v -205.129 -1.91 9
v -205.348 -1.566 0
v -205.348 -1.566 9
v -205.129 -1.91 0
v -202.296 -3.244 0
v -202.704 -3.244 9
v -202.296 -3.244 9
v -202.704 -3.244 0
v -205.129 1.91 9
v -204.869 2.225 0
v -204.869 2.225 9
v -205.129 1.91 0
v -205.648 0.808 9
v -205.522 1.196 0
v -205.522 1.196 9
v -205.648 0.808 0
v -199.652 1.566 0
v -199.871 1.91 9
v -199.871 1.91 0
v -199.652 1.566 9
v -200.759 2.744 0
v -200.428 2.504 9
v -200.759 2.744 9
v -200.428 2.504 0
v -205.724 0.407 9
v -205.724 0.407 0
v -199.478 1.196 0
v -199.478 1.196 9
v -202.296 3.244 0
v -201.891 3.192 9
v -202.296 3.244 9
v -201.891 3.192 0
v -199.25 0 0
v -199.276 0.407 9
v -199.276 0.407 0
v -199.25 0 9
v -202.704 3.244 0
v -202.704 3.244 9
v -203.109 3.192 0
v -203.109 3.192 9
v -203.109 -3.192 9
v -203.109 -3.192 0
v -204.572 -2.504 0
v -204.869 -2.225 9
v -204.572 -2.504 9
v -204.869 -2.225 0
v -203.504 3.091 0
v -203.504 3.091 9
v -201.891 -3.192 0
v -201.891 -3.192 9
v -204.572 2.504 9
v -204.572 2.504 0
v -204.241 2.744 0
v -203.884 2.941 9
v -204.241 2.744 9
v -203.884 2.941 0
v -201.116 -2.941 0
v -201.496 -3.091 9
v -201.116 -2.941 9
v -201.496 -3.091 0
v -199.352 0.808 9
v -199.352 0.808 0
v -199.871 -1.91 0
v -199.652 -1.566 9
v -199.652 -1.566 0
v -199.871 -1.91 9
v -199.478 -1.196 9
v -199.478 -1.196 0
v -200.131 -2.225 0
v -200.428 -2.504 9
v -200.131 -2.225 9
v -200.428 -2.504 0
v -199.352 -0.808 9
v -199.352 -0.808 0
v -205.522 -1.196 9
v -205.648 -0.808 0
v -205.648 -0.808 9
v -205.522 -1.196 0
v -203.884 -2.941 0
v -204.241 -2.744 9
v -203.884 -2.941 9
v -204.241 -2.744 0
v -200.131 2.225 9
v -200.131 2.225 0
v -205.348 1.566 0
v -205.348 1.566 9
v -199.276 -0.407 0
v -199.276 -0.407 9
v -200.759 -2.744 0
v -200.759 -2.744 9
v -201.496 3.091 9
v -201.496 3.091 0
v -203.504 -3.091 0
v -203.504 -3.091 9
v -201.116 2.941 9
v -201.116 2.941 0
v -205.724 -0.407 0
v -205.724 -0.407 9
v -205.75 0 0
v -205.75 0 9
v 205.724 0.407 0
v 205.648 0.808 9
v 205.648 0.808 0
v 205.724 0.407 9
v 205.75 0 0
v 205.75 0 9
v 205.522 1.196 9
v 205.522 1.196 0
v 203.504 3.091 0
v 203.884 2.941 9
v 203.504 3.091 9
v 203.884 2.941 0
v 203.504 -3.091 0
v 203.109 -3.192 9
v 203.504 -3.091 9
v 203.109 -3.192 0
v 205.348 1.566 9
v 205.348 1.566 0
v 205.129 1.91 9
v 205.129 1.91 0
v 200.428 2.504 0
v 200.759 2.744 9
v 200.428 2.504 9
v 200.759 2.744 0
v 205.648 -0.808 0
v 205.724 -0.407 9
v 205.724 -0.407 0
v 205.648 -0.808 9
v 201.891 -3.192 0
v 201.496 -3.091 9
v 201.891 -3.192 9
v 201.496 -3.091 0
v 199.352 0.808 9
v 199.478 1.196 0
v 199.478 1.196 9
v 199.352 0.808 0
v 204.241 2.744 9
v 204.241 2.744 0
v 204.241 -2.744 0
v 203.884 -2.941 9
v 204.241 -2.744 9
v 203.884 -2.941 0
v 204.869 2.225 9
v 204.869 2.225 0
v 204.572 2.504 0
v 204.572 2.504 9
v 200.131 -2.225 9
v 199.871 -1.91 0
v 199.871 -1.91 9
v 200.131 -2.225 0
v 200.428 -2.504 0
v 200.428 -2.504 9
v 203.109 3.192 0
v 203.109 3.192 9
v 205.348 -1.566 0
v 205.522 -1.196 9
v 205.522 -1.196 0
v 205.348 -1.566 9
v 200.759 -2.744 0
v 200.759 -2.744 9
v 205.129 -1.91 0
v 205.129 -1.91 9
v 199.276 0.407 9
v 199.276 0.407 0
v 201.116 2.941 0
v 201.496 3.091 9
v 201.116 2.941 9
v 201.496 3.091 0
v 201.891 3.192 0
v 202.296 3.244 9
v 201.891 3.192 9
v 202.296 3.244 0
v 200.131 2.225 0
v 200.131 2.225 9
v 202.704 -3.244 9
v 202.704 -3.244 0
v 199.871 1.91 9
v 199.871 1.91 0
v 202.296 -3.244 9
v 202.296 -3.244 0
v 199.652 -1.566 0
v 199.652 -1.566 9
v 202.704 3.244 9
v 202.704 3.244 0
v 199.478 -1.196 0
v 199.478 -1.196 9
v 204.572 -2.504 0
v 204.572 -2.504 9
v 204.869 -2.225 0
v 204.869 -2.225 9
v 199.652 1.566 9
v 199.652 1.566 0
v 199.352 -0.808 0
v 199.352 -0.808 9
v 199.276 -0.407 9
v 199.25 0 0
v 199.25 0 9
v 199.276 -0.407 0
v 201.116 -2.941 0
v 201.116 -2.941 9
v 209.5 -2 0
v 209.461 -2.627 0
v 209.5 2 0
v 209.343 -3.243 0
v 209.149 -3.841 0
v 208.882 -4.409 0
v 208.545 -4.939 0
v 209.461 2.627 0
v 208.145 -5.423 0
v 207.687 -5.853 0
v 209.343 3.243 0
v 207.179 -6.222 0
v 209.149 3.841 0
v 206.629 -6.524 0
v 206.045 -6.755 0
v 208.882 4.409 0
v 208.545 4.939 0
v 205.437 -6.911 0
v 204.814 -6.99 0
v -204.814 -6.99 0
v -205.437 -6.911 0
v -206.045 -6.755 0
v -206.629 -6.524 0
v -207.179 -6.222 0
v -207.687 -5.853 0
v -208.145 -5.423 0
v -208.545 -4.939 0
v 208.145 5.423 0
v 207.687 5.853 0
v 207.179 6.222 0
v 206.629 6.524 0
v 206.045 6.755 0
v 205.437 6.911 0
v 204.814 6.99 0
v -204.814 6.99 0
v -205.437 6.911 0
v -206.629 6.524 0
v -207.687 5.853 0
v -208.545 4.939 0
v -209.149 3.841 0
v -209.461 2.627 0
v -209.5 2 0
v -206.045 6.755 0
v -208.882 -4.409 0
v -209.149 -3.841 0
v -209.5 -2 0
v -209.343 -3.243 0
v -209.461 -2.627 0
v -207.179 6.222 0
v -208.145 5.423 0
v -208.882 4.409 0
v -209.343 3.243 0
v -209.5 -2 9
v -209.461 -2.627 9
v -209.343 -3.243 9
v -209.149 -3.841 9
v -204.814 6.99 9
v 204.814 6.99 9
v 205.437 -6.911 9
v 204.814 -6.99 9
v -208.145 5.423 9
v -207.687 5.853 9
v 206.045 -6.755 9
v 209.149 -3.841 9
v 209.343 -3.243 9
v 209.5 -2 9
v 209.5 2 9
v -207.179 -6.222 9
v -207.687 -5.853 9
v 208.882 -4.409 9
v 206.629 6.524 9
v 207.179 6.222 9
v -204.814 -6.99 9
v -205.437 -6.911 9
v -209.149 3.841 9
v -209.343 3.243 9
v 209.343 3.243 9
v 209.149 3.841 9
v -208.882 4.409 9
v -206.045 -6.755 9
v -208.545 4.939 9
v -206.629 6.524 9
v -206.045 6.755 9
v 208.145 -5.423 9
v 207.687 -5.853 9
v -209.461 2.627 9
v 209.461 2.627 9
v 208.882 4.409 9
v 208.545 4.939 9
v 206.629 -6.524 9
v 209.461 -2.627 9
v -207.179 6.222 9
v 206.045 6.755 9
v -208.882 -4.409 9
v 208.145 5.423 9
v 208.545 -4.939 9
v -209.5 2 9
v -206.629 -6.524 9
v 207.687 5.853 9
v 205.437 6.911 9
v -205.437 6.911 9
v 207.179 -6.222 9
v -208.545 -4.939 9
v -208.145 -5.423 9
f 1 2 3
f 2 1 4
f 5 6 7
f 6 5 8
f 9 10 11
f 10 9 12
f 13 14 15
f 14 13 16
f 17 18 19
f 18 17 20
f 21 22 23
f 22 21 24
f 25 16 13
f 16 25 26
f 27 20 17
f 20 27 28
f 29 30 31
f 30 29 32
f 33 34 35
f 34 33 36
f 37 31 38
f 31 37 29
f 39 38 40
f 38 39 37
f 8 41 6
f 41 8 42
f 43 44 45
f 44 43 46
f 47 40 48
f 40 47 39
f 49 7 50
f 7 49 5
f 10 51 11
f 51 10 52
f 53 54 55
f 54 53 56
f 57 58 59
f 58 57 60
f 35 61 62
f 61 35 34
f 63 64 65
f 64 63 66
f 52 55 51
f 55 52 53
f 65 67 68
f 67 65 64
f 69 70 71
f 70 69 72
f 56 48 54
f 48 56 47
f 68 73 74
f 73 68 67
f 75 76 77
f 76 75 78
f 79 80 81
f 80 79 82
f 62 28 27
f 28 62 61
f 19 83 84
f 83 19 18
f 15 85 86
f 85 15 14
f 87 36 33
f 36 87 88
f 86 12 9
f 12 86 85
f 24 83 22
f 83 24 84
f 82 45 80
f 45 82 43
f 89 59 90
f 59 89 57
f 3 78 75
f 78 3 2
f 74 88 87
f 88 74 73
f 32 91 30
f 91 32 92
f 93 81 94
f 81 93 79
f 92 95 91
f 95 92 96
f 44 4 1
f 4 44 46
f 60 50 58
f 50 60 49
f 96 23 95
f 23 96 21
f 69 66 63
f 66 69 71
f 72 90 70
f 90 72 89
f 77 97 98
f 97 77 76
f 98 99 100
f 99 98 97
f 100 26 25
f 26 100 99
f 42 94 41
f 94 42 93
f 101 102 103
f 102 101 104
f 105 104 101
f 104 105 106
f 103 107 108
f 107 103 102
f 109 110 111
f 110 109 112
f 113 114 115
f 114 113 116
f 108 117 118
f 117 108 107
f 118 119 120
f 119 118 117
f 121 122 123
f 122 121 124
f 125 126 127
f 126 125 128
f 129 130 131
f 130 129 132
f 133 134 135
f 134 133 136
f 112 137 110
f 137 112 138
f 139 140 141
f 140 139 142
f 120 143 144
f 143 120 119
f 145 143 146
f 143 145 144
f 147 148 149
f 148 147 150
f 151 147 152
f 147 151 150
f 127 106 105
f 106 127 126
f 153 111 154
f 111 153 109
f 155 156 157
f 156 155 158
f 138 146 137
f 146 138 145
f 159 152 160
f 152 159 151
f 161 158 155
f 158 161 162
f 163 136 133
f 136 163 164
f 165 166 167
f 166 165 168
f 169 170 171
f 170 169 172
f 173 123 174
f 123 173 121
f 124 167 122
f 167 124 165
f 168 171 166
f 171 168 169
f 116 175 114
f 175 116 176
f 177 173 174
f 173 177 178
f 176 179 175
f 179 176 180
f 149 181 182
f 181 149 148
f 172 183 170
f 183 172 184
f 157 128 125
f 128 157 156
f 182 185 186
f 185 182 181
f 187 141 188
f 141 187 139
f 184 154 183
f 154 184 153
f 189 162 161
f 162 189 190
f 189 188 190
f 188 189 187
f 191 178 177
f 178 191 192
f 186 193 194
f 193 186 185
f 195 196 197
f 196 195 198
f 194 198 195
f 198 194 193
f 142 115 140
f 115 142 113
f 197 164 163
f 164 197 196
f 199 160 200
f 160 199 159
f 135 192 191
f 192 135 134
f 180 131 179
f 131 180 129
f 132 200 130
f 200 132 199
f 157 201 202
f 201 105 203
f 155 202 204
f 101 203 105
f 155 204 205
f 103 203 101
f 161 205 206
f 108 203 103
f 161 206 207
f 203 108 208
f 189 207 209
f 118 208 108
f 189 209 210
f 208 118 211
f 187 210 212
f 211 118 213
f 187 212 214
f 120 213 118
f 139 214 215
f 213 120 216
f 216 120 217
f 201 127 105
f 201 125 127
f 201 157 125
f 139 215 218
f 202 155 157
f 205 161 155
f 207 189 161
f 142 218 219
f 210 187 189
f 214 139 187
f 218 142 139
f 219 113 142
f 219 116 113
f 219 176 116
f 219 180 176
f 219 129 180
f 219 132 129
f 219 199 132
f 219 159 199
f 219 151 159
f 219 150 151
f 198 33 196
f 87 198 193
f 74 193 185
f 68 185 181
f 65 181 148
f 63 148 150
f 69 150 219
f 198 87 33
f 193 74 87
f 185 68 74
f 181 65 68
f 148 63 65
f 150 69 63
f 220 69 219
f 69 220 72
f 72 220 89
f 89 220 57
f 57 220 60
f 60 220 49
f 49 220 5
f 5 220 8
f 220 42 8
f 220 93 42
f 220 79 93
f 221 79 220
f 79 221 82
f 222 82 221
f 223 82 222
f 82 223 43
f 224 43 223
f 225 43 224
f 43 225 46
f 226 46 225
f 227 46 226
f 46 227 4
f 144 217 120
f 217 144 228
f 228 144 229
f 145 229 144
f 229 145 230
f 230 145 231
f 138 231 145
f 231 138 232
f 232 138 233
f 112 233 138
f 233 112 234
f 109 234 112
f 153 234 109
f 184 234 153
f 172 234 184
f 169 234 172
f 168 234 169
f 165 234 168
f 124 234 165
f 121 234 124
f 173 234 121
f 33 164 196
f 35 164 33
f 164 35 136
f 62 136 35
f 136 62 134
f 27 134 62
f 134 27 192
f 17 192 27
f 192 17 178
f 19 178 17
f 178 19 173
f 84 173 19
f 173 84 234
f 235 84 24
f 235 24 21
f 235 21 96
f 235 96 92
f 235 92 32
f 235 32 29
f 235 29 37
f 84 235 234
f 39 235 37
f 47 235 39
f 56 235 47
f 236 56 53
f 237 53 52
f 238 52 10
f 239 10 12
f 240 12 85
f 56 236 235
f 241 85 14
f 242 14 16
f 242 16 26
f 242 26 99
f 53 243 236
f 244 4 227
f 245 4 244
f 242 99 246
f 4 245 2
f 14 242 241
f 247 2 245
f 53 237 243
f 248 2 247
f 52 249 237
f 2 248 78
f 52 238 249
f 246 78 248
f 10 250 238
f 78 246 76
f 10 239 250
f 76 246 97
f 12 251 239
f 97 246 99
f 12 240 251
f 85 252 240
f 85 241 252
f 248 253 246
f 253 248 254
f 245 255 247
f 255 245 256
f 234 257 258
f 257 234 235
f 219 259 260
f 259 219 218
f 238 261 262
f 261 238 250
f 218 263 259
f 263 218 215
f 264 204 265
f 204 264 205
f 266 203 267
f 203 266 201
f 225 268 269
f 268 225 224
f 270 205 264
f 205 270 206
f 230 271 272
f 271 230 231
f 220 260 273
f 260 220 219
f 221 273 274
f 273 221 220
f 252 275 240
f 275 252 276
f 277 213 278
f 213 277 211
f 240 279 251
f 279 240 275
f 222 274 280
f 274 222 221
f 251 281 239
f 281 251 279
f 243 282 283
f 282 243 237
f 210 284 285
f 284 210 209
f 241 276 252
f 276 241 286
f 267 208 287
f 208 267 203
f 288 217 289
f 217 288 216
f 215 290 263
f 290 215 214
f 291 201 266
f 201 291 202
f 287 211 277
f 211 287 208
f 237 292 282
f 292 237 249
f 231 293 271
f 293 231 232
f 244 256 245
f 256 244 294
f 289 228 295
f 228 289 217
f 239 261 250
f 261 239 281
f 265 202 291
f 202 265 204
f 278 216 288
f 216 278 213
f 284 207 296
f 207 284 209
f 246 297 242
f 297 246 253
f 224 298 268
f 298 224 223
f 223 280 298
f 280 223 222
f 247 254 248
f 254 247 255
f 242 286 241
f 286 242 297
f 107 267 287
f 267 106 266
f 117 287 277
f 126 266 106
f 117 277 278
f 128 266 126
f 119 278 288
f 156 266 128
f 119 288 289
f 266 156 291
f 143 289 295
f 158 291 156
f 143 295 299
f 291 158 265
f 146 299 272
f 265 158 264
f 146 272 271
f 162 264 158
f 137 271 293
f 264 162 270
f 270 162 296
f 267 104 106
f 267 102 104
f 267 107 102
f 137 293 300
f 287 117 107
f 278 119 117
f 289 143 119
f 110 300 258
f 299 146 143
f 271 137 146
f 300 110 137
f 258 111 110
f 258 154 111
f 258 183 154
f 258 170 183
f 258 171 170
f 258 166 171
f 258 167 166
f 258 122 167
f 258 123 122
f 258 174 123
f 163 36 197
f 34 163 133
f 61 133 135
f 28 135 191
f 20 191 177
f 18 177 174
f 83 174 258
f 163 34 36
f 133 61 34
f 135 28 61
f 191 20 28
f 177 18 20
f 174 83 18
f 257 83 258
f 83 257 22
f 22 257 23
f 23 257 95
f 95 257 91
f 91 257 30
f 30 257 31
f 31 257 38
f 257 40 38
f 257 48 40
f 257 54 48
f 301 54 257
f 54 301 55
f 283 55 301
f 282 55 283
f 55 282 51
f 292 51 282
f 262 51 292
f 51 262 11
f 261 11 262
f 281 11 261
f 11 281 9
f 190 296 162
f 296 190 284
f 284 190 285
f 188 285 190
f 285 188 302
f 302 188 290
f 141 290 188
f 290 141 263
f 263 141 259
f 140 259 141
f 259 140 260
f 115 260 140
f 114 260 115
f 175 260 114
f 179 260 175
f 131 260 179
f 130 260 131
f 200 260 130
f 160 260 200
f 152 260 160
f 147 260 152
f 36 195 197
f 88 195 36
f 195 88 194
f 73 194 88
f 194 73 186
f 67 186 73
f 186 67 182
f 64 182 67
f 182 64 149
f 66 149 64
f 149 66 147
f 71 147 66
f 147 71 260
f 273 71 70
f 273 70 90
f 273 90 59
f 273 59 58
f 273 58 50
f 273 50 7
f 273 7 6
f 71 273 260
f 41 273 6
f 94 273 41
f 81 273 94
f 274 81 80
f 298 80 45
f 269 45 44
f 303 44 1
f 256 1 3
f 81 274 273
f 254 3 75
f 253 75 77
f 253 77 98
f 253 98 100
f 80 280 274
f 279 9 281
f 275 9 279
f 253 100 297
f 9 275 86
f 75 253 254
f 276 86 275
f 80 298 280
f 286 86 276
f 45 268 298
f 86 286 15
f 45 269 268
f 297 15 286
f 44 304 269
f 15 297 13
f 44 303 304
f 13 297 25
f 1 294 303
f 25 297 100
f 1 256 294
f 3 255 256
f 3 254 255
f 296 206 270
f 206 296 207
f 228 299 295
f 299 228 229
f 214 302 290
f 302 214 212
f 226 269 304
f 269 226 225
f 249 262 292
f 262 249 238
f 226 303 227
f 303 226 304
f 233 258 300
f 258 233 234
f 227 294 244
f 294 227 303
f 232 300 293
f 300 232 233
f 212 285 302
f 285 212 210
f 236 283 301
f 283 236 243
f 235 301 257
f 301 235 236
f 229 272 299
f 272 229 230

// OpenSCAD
$fn = 50;


difference() {
	union() {
		hull() {
			translate(v = [-204.5000000000, 2.0000000000, 0]) {
				cylinder(h = 9, r = 5);
			}
			translate(v = [204.5000000000, 2.0000000000, 0]) {
				cylinder(h = 9, r = 5);
			}
			translate(v = [-204.5000000000, -2.0000000000, 0]) {
				cylinder(h = 9, r = 5);
			}
			translate(v = [204.5000000000, -2.0000000000, 0]) {
				cylinder(h = 9, r = 5);
			}
		}
	}
	union() {
		translate(v = [-202.5000000000, 0.0000000000, -100.0000000000]) {
			cylinder(h = 200, r = 3.2500000000);
		}
		translate(v = [-202.5000000000, 0.0000000000, -100.0000000000]) {
			cylinder(h = 200, r = 3.2500000000);
		}
		translate(v = [202.5000000000, 0.0000000000, -100.0000000000]) {
			cylinder(h = 200, r = 3.2500000000);
		}
		translate(v = [202.5000000000, 0.0000000000, -100.0000000000]) {
			cylinder(h = 200, r = 3.2500000000);
		}
	}
}
